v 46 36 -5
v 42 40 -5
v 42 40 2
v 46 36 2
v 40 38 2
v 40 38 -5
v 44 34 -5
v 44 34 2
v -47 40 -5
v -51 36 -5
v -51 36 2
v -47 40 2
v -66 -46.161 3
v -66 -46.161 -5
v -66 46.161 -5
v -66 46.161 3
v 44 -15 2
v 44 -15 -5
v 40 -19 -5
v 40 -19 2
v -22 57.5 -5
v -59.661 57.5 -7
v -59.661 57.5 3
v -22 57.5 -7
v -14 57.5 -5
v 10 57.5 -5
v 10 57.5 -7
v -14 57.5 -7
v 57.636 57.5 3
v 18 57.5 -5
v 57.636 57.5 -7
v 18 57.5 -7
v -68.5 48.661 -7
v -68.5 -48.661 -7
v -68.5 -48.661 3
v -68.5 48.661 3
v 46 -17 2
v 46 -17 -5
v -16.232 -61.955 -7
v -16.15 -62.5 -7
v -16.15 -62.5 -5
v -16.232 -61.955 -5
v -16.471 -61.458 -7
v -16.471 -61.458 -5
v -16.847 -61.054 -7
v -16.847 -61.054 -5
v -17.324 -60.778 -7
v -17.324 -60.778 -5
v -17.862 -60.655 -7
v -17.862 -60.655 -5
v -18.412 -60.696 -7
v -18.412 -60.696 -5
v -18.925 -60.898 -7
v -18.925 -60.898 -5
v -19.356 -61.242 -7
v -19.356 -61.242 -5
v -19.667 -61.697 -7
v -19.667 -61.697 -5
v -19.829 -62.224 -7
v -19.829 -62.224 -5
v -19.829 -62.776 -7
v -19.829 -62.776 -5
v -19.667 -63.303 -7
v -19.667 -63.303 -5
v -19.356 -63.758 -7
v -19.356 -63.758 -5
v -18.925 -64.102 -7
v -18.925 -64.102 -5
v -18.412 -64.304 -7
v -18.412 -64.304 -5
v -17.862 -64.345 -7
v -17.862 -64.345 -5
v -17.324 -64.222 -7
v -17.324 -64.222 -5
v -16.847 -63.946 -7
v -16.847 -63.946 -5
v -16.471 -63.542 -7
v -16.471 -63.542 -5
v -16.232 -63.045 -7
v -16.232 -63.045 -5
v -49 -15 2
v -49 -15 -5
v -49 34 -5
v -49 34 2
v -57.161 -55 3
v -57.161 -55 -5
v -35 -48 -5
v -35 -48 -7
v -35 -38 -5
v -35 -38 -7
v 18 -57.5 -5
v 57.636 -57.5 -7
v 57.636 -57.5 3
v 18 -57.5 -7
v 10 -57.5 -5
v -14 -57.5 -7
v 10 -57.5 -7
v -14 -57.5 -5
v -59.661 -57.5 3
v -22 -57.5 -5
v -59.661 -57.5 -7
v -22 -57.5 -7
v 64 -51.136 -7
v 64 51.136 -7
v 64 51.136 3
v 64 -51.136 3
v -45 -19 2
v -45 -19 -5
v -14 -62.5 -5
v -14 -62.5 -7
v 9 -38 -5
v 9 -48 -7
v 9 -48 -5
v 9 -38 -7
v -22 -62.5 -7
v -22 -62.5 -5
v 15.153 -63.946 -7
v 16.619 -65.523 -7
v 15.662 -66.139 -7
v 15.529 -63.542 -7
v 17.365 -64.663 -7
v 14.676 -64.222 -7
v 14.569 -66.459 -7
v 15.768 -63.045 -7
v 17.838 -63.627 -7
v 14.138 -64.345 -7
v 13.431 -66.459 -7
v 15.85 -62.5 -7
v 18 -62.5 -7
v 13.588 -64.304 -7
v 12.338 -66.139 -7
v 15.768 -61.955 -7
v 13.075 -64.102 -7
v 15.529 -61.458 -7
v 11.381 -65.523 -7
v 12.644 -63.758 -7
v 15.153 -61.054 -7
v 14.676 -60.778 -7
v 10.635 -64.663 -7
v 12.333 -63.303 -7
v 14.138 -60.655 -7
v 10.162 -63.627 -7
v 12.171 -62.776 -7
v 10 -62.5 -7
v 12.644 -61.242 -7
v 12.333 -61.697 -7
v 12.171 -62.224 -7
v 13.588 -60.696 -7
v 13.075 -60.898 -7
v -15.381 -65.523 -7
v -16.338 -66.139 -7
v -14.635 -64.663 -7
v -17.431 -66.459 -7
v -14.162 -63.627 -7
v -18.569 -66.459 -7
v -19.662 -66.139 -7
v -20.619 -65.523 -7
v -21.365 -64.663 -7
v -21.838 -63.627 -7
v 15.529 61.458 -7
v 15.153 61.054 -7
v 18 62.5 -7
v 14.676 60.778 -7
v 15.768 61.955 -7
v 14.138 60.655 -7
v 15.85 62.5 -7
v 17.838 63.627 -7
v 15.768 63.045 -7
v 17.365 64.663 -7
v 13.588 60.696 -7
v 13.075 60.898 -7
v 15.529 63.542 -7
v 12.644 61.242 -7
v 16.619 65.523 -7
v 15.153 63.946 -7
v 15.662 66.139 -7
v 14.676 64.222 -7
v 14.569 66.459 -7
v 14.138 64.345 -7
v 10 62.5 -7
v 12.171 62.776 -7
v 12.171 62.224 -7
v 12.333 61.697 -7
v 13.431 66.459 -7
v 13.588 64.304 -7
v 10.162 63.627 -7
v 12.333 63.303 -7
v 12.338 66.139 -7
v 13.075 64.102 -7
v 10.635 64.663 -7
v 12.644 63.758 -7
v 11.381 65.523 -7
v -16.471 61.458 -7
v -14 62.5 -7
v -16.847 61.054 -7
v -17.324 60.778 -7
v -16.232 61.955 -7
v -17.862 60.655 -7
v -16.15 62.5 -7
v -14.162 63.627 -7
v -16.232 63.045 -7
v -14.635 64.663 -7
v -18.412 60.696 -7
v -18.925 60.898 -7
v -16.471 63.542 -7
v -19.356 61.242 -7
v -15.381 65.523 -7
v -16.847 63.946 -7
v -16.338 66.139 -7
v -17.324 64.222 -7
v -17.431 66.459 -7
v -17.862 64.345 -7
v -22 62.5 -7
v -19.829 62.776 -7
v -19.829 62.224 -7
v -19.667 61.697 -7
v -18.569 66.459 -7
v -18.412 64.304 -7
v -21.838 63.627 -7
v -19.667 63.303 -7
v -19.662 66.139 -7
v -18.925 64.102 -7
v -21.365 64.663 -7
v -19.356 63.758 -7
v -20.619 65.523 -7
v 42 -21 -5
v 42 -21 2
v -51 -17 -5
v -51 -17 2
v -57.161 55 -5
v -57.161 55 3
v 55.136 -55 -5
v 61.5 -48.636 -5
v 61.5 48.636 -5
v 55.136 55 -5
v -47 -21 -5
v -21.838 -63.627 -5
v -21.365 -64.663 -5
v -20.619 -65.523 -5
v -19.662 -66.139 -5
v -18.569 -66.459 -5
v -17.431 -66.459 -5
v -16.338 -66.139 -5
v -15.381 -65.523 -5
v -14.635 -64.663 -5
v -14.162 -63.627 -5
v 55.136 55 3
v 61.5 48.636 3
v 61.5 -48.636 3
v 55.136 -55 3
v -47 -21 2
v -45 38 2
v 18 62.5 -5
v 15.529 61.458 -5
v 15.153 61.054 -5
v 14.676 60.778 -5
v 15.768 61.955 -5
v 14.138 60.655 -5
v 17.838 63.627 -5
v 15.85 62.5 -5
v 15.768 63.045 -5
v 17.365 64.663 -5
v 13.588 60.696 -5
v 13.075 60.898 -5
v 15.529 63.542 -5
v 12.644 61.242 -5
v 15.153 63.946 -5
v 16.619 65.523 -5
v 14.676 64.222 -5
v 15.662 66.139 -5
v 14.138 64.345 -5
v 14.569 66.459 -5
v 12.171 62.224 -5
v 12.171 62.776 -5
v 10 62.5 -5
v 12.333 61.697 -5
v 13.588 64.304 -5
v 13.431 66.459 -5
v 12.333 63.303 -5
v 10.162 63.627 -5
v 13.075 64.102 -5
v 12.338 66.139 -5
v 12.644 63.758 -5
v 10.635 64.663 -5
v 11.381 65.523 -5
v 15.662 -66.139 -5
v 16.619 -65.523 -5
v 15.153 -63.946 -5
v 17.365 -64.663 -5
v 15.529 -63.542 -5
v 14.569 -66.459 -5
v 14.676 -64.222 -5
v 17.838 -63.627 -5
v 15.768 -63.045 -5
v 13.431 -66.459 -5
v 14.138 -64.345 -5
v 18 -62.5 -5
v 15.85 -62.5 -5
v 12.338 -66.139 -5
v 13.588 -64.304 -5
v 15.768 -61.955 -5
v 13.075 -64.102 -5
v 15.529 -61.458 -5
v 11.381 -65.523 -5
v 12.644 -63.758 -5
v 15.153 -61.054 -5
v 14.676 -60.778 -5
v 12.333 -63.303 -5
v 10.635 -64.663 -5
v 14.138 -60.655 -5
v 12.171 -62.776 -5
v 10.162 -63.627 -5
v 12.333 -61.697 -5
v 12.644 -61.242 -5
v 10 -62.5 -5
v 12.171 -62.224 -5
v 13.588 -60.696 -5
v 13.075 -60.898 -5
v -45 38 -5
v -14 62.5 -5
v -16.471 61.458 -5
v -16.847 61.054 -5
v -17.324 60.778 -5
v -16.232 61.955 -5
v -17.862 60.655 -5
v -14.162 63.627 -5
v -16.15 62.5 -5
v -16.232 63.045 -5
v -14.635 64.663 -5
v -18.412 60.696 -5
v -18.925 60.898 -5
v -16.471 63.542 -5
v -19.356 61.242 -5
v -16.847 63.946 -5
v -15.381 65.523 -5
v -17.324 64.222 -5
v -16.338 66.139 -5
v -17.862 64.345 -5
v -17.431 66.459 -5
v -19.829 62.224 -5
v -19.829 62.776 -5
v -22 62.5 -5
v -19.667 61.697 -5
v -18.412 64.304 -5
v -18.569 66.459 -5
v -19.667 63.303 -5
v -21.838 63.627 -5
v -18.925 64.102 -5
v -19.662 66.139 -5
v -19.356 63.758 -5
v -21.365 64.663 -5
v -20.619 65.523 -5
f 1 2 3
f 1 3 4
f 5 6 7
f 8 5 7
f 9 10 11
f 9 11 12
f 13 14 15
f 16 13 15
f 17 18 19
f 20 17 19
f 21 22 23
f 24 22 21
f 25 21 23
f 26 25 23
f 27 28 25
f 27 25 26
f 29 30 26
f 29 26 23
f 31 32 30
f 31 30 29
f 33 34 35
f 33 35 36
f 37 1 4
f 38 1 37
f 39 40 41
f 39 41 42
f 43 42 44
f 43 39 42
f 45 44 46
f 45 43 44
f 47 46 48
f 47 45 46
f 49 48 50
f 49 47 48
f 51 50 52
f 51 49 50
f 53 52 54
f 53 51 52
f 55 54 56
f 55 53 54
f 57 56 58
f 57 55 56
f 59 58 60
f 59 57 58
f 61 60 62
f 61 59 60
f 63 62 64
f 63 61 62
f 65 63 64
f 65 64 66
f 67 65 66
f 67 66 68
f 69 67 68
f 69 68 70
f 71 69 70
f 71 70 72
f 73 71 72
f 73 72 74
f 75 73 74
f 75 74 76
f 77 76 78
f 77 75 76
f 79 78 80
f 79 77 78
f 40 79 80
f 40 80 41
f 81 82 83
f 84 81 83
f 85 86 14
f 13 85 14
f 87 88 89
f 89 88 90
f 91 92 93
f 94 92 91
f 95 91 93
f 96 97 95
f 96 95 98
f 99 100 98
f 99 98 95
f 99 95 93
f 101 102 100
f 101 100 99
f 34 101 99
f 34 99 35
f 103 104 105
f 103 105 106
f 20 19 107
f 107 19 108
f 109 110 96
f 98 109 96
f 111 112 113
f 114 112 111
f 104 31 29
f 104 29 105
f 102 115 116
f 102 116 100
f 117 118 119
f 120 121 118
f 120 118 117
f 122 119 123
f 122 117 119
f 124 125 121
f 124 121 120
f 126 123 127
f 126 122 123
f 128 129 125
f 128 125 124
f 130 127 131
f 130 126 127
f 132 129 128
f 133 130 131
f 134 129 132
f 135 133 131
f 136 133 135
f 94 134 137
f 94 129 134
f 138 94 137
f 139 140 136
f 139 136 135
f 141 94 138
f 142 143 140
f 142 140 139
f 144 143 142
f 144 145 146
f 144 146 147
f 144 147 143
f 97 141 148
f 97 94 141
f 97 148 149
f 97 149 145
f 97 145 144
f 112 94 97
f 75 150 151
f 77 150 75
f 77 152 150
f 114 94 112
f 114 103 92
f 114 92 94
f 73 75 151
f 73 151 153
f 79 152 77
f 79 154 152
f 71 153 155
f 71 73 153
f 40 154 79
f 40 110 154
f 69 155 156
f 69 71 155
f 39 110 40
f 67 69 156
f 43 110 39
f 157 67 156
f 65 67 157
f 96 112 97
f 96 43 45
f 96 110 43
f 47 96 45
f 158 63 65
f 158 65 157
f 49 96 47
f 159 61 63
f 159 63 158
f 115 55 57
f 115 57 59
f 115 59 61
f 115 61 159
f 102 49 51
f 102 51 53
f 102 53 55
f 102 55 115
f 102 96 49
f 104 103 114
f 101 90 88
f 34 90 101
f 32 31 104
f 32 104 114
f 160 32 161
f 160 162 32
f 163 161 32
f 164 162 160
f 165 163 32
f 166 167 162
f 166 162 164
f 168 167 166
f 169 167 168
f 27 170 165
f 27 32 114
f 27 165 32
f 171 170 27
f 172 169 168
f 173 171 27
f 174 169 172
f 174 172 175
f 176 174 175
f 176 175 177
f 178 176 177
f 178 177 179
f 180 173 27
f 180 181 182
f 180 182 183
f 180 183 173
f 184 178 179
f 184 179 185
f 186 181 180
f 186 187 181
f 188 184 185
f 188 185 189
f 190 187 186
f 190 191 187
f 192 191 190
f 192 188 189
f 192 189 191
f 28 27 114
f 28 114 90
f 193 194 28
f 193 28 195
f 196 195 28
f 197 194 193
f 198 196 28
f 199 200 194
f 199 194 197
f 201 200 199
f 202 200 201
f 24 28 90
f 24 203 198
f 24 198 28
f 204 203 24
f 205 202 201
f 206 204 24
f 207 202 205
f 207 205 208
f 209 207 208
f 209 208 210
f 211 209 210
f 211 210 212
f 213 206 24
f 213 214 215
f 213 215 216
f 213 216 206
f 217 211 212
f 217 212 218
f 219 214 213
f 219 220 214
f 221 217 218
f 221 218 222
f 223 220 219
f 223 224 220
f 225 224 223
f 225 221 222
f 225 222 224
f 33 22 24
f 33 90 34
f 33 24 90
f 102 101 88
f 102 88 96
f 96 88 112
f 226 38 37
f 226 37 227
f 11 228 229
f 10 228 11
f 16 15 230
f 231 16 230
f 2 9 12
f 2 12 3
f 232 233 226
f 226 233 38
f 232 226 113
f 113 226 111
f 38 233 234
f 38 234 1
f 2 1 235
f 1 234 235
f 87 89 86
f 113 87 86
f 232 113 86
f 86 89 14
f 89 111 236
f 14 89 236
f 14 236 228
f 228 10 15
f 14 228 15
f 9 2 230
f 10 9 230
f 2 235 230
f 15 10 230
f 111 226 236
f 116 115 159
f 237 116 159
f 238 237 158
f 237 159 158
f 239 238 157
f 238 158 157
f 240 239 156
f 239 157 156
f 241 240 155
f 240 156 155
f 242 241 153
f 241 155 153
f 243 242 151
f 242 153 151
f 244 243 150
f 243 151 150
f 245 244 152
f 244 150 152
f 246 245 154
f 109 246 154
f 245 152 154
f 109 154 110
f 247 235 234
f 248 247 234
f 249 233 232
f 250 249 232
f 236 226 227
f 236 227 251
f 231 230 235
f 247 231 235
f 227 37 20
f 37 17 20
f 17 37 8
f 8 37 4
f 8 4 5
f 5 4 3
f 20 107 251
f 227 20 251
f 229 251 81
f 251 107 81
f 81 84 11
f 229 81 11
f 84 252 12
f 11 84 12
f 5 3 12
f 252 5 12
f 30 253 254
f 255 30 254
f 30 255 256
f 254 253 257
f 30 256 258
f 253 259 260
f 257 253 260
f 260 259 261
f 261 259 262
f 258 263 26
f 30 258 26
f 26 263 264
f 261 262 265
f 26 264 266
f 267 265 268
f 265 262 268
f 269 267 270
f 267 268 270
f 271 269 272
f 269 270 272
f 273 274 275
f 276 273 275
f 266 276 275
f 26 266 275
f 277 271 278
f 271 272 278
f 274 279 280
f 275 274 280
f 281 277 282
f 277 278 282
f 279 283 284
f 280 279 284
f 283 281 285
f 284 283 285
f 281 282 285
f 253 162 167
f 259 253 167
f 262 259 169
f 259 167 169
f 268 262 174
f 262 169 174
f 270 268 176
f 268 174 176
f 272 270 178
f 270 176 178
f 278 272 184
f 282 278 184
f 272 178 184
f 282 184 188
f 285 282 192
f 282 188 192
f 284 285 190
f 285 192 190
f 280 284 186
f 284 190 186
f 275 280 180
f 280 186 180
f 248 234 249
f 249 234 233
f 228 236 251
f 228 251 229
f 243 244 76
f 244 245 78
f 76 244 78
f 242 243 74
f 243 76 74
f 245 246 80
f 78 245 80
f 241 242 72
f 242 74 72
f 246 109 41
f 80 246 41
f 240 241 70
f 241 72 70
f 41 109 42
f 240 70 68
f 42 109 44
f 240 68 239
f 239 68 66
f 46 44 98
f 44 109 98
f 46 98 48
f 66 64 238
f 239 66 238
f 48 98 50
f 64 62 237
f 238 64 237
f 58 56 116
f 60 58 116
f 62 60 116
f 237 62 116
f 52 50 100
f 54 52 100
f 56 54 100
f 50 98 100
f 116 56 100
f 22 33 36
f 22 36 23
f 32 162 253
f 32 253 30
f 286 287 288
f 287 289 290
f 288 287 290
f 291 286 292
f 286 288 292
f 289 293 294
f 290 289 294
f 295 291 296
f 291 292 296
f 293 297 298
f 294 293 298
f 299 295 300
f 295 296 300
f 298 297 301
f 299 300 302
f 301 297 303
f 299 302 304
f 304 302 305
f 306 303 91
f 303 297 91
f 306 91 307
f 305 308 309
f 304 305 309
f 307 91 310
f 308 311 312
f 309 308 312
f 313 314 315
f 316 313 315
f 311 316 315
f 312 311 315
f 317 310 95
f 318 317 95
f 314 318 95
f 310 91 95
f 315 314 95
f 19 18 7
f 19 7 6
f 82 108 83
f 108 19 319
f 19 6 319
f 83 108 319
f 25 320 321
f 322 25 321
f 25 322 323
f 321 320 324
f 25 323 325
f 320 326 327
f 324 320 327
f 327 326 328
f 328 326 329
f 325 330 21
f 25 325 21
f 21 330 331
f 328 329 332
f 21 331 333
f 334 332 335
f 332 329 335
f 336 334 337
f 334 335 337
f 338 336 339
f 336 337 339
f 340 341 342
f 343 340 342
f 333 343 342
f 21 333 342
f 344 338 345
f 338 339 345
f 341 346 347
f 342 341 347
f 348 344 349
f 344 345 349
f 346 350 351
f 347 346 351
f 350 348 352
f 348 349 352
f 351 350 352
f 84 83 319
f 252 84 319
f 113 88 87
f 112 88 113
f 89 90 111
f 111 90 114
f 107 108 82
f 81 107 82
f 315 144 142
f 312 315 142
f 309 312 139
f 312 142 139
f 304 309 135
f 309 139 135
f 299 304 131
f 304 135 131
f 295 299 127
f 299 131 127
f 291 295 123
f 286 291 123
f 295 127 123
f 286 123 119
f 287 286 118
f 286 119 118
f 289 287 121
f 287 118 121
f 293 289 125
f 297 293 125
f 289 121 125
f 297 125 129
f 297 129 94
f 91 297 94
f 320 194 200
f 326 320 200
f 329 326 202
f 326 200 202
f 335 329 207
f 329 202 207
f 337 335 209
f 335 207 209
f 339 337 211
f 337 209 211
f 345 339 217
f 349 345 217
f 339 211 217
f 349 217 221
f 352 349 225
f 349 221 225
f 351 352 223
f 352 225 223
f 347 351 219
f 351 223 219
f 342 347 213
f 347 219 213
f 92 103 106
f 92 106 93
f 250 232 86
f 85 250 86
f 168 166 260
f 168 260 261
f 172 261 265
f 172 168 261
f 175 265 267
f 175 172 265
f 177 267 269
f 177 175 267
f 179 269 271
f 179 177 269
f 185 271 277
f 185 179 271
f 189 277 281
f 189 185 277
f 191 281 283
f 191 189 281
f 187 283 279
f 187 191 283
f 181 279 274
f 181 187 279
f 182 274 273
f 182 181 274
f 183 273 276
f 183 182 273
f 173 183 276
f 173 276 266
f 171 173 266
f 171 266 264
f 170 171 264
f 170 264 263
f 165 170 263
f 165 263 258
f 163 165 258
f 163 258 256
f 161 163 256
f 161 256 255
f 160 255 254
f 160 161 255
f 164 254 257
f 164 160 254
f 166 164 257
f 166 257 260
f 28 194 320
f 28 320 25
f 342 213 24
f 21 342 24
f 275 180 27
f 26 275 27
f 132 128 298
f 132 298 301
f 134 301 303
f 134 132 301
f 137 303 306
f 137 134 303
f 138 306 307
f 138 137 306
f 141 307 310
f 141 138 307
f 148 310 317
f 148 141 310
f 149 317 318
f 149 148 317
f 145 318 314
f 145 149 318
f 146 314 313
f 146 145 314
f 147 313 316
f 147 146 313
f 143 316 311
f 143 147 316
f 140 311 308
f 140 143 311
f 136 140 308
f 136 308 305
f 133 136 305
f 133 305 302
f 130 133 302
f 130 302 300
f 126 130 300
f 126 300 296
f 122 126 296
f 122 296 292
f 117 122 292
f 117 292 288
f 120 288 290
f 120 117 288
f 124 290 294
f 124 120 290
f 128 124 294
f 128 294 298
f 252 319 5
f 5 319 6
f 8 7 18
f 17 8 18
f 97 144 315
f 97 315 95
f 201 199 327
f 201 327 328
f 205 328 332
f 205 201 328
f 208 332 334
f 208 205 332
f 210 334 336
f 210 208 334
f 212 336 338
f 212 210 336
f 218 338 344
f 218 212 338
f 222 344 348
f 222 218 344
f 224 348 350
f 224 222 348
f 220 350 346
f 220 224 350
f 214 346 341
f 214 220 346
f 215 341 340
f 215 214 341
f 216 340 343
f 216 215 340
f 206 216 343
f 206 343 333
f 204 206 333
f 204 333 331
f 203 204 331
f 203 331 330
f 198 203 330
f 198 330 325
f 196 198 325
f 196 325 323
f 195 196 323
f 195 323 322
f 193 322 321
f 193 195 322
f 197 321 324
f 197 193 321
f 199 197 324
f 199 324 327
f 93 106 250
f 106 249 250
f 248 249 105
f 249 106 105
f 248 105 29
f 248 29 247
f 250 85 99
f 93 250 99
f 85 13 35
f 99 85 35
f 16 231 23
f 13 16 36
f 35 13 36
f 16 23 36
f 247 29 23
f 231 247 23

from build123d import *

# Parameters (mm, degrees)
EXTRUDE083_DEPTH = 9
SKETCH095_R      = 1.85
SKETCH095_W      = 44
SKETCH095_H      = 10
EXTRUDE084_DEPTH = 2
EXTRUDE082_DEPTH = 10


with BuildPart() as extrude083:
    # Sketch094 → Extrude083 (new body)
    with BuildSketch(Plane.XY):
        Polygon((-51, 36), (-47, 40), (42, 40), (46, 36), (46, -17), (42, -21), (-47, -21), (-51, -17), align=None)
        Polygon((-45, 38), (40, 38), (44, 34), (44, -15), (40, -19), (-45, -19), (-49, -15), (-49, 34), align=None, mode=Mode.SUBTRACT)
    extrude(amount=EXTRUDE083_DEPTH)


with BuildPart() as extrude084:
    # Sketch095 → Extrude084 (new body)
    with BuildSketch(Plane.XY):
        with BuildLine():
            Line((57.636039, 57.5), (64, 51.136039))
            Line((64, 51.136039), (64, -51.136039))
            Line((64, -51.136039), (57.636039, -57.5))
            Line((18, -57.5), (57.636039, -57.5))
            Line((18, -62.50002), (18, -57.5))
            ThreePointArc((10, -62.50002), (14, -66.500019), (18, -62.50002))
            Line((10, -62.50002), (10, -57.5))
            Line((-14, -57.5), (10, -57.5))
            Line((-14, -62.50002), (-14, -57.5))
            ThreePointArc((-22, -62.50002), (-18, -66.5), (-14, -62.50002))
            Line((-22, -62.50002), (-22, -57.5))
            Line((-59.661165, -57.5), (-22, -57.5))
            Line((-59.661165, -57.5), (-68.5, -48.661165))
            Line((-68.5, -48.661165), (-68.5, 48.661165))
            Line((-68.5, 48.661165), (-59.661165, 57.5))
            Line((-59.661165, 57.5), (-22, 57.5))
            Line((-22, 62.5), (-22, 57.5))
            ThreePointArc((-14, 62.5), (-18, 66.5), (-22, 62.5))
            Line((-14, 62.5), (-14, 57.5))
            Line((-14, 57.5), (10, 57.5))
            Line((10, 62.5), (10, 57.5))
            ThreePointArc((18, 62.5), (14, 66.5), (10, 62.5))
            Line((18, 62.5), (18, 57.5))
            Line((18, 57.5), (57.636039, 57.5))
        make_face()
        with Locations((-18, 62.5)):
            Circle(SKETCH095_R, mode=Mode.SUBTRACT)
        with Locations((14, 62.5)):
            Circle(SKETCH095_R, mode=Mode.SUBTRACT)
        with Locations((-18, -62.5)):
            Circle(SKETCH095_R, mode=Mode.SUBTRACT)
        with Locations((14, -62.500019)):
            Circle(SKETCH095_R, mode=Mode.SUBTRACT)
        with Locations((-13, -43)):
            Rectangle(SKETCH095_W, SKETCH095_H, mode=Mode.SUBTRACT)
    extrude(amount=EXTRUDE084_DEPTH)


with BuildPart() as fusion033:
    # Sketch093 → Extrude082 (new body)
    with BuildSketch(Plane.XY):
        Polygon((-59.661165, 57.5), (57.636039, 57.5), (64, 51.136039), (64, -51.136039), (57.636039, -57.5), (-59.661165, -57.5), (-68.5, -48.661165), (-68.5, 48.661165), align=None)
        Polygon((-57.161165, 55), (55.136039, 55), (61.5, 48.636039), (61.5, -48.636039), (55.136039, -55), (-57.161165, -55), (-66, -46.161165), (-66, 46.161165), align=None, mode=Mode.SUBTRACT)
    extrude(amount=EXTRUDE082_DEPTH)

    # Fusion033: union Extrude083, Extrude084
    add(extrude083.part)
    add(extrude084.part)


with BuildPart() as fusion033_1:
    # Fusion033 placement: moved
    add(fusion033.part.moved(Location((0, 0, -7))))


solid = fusion033_1.part
